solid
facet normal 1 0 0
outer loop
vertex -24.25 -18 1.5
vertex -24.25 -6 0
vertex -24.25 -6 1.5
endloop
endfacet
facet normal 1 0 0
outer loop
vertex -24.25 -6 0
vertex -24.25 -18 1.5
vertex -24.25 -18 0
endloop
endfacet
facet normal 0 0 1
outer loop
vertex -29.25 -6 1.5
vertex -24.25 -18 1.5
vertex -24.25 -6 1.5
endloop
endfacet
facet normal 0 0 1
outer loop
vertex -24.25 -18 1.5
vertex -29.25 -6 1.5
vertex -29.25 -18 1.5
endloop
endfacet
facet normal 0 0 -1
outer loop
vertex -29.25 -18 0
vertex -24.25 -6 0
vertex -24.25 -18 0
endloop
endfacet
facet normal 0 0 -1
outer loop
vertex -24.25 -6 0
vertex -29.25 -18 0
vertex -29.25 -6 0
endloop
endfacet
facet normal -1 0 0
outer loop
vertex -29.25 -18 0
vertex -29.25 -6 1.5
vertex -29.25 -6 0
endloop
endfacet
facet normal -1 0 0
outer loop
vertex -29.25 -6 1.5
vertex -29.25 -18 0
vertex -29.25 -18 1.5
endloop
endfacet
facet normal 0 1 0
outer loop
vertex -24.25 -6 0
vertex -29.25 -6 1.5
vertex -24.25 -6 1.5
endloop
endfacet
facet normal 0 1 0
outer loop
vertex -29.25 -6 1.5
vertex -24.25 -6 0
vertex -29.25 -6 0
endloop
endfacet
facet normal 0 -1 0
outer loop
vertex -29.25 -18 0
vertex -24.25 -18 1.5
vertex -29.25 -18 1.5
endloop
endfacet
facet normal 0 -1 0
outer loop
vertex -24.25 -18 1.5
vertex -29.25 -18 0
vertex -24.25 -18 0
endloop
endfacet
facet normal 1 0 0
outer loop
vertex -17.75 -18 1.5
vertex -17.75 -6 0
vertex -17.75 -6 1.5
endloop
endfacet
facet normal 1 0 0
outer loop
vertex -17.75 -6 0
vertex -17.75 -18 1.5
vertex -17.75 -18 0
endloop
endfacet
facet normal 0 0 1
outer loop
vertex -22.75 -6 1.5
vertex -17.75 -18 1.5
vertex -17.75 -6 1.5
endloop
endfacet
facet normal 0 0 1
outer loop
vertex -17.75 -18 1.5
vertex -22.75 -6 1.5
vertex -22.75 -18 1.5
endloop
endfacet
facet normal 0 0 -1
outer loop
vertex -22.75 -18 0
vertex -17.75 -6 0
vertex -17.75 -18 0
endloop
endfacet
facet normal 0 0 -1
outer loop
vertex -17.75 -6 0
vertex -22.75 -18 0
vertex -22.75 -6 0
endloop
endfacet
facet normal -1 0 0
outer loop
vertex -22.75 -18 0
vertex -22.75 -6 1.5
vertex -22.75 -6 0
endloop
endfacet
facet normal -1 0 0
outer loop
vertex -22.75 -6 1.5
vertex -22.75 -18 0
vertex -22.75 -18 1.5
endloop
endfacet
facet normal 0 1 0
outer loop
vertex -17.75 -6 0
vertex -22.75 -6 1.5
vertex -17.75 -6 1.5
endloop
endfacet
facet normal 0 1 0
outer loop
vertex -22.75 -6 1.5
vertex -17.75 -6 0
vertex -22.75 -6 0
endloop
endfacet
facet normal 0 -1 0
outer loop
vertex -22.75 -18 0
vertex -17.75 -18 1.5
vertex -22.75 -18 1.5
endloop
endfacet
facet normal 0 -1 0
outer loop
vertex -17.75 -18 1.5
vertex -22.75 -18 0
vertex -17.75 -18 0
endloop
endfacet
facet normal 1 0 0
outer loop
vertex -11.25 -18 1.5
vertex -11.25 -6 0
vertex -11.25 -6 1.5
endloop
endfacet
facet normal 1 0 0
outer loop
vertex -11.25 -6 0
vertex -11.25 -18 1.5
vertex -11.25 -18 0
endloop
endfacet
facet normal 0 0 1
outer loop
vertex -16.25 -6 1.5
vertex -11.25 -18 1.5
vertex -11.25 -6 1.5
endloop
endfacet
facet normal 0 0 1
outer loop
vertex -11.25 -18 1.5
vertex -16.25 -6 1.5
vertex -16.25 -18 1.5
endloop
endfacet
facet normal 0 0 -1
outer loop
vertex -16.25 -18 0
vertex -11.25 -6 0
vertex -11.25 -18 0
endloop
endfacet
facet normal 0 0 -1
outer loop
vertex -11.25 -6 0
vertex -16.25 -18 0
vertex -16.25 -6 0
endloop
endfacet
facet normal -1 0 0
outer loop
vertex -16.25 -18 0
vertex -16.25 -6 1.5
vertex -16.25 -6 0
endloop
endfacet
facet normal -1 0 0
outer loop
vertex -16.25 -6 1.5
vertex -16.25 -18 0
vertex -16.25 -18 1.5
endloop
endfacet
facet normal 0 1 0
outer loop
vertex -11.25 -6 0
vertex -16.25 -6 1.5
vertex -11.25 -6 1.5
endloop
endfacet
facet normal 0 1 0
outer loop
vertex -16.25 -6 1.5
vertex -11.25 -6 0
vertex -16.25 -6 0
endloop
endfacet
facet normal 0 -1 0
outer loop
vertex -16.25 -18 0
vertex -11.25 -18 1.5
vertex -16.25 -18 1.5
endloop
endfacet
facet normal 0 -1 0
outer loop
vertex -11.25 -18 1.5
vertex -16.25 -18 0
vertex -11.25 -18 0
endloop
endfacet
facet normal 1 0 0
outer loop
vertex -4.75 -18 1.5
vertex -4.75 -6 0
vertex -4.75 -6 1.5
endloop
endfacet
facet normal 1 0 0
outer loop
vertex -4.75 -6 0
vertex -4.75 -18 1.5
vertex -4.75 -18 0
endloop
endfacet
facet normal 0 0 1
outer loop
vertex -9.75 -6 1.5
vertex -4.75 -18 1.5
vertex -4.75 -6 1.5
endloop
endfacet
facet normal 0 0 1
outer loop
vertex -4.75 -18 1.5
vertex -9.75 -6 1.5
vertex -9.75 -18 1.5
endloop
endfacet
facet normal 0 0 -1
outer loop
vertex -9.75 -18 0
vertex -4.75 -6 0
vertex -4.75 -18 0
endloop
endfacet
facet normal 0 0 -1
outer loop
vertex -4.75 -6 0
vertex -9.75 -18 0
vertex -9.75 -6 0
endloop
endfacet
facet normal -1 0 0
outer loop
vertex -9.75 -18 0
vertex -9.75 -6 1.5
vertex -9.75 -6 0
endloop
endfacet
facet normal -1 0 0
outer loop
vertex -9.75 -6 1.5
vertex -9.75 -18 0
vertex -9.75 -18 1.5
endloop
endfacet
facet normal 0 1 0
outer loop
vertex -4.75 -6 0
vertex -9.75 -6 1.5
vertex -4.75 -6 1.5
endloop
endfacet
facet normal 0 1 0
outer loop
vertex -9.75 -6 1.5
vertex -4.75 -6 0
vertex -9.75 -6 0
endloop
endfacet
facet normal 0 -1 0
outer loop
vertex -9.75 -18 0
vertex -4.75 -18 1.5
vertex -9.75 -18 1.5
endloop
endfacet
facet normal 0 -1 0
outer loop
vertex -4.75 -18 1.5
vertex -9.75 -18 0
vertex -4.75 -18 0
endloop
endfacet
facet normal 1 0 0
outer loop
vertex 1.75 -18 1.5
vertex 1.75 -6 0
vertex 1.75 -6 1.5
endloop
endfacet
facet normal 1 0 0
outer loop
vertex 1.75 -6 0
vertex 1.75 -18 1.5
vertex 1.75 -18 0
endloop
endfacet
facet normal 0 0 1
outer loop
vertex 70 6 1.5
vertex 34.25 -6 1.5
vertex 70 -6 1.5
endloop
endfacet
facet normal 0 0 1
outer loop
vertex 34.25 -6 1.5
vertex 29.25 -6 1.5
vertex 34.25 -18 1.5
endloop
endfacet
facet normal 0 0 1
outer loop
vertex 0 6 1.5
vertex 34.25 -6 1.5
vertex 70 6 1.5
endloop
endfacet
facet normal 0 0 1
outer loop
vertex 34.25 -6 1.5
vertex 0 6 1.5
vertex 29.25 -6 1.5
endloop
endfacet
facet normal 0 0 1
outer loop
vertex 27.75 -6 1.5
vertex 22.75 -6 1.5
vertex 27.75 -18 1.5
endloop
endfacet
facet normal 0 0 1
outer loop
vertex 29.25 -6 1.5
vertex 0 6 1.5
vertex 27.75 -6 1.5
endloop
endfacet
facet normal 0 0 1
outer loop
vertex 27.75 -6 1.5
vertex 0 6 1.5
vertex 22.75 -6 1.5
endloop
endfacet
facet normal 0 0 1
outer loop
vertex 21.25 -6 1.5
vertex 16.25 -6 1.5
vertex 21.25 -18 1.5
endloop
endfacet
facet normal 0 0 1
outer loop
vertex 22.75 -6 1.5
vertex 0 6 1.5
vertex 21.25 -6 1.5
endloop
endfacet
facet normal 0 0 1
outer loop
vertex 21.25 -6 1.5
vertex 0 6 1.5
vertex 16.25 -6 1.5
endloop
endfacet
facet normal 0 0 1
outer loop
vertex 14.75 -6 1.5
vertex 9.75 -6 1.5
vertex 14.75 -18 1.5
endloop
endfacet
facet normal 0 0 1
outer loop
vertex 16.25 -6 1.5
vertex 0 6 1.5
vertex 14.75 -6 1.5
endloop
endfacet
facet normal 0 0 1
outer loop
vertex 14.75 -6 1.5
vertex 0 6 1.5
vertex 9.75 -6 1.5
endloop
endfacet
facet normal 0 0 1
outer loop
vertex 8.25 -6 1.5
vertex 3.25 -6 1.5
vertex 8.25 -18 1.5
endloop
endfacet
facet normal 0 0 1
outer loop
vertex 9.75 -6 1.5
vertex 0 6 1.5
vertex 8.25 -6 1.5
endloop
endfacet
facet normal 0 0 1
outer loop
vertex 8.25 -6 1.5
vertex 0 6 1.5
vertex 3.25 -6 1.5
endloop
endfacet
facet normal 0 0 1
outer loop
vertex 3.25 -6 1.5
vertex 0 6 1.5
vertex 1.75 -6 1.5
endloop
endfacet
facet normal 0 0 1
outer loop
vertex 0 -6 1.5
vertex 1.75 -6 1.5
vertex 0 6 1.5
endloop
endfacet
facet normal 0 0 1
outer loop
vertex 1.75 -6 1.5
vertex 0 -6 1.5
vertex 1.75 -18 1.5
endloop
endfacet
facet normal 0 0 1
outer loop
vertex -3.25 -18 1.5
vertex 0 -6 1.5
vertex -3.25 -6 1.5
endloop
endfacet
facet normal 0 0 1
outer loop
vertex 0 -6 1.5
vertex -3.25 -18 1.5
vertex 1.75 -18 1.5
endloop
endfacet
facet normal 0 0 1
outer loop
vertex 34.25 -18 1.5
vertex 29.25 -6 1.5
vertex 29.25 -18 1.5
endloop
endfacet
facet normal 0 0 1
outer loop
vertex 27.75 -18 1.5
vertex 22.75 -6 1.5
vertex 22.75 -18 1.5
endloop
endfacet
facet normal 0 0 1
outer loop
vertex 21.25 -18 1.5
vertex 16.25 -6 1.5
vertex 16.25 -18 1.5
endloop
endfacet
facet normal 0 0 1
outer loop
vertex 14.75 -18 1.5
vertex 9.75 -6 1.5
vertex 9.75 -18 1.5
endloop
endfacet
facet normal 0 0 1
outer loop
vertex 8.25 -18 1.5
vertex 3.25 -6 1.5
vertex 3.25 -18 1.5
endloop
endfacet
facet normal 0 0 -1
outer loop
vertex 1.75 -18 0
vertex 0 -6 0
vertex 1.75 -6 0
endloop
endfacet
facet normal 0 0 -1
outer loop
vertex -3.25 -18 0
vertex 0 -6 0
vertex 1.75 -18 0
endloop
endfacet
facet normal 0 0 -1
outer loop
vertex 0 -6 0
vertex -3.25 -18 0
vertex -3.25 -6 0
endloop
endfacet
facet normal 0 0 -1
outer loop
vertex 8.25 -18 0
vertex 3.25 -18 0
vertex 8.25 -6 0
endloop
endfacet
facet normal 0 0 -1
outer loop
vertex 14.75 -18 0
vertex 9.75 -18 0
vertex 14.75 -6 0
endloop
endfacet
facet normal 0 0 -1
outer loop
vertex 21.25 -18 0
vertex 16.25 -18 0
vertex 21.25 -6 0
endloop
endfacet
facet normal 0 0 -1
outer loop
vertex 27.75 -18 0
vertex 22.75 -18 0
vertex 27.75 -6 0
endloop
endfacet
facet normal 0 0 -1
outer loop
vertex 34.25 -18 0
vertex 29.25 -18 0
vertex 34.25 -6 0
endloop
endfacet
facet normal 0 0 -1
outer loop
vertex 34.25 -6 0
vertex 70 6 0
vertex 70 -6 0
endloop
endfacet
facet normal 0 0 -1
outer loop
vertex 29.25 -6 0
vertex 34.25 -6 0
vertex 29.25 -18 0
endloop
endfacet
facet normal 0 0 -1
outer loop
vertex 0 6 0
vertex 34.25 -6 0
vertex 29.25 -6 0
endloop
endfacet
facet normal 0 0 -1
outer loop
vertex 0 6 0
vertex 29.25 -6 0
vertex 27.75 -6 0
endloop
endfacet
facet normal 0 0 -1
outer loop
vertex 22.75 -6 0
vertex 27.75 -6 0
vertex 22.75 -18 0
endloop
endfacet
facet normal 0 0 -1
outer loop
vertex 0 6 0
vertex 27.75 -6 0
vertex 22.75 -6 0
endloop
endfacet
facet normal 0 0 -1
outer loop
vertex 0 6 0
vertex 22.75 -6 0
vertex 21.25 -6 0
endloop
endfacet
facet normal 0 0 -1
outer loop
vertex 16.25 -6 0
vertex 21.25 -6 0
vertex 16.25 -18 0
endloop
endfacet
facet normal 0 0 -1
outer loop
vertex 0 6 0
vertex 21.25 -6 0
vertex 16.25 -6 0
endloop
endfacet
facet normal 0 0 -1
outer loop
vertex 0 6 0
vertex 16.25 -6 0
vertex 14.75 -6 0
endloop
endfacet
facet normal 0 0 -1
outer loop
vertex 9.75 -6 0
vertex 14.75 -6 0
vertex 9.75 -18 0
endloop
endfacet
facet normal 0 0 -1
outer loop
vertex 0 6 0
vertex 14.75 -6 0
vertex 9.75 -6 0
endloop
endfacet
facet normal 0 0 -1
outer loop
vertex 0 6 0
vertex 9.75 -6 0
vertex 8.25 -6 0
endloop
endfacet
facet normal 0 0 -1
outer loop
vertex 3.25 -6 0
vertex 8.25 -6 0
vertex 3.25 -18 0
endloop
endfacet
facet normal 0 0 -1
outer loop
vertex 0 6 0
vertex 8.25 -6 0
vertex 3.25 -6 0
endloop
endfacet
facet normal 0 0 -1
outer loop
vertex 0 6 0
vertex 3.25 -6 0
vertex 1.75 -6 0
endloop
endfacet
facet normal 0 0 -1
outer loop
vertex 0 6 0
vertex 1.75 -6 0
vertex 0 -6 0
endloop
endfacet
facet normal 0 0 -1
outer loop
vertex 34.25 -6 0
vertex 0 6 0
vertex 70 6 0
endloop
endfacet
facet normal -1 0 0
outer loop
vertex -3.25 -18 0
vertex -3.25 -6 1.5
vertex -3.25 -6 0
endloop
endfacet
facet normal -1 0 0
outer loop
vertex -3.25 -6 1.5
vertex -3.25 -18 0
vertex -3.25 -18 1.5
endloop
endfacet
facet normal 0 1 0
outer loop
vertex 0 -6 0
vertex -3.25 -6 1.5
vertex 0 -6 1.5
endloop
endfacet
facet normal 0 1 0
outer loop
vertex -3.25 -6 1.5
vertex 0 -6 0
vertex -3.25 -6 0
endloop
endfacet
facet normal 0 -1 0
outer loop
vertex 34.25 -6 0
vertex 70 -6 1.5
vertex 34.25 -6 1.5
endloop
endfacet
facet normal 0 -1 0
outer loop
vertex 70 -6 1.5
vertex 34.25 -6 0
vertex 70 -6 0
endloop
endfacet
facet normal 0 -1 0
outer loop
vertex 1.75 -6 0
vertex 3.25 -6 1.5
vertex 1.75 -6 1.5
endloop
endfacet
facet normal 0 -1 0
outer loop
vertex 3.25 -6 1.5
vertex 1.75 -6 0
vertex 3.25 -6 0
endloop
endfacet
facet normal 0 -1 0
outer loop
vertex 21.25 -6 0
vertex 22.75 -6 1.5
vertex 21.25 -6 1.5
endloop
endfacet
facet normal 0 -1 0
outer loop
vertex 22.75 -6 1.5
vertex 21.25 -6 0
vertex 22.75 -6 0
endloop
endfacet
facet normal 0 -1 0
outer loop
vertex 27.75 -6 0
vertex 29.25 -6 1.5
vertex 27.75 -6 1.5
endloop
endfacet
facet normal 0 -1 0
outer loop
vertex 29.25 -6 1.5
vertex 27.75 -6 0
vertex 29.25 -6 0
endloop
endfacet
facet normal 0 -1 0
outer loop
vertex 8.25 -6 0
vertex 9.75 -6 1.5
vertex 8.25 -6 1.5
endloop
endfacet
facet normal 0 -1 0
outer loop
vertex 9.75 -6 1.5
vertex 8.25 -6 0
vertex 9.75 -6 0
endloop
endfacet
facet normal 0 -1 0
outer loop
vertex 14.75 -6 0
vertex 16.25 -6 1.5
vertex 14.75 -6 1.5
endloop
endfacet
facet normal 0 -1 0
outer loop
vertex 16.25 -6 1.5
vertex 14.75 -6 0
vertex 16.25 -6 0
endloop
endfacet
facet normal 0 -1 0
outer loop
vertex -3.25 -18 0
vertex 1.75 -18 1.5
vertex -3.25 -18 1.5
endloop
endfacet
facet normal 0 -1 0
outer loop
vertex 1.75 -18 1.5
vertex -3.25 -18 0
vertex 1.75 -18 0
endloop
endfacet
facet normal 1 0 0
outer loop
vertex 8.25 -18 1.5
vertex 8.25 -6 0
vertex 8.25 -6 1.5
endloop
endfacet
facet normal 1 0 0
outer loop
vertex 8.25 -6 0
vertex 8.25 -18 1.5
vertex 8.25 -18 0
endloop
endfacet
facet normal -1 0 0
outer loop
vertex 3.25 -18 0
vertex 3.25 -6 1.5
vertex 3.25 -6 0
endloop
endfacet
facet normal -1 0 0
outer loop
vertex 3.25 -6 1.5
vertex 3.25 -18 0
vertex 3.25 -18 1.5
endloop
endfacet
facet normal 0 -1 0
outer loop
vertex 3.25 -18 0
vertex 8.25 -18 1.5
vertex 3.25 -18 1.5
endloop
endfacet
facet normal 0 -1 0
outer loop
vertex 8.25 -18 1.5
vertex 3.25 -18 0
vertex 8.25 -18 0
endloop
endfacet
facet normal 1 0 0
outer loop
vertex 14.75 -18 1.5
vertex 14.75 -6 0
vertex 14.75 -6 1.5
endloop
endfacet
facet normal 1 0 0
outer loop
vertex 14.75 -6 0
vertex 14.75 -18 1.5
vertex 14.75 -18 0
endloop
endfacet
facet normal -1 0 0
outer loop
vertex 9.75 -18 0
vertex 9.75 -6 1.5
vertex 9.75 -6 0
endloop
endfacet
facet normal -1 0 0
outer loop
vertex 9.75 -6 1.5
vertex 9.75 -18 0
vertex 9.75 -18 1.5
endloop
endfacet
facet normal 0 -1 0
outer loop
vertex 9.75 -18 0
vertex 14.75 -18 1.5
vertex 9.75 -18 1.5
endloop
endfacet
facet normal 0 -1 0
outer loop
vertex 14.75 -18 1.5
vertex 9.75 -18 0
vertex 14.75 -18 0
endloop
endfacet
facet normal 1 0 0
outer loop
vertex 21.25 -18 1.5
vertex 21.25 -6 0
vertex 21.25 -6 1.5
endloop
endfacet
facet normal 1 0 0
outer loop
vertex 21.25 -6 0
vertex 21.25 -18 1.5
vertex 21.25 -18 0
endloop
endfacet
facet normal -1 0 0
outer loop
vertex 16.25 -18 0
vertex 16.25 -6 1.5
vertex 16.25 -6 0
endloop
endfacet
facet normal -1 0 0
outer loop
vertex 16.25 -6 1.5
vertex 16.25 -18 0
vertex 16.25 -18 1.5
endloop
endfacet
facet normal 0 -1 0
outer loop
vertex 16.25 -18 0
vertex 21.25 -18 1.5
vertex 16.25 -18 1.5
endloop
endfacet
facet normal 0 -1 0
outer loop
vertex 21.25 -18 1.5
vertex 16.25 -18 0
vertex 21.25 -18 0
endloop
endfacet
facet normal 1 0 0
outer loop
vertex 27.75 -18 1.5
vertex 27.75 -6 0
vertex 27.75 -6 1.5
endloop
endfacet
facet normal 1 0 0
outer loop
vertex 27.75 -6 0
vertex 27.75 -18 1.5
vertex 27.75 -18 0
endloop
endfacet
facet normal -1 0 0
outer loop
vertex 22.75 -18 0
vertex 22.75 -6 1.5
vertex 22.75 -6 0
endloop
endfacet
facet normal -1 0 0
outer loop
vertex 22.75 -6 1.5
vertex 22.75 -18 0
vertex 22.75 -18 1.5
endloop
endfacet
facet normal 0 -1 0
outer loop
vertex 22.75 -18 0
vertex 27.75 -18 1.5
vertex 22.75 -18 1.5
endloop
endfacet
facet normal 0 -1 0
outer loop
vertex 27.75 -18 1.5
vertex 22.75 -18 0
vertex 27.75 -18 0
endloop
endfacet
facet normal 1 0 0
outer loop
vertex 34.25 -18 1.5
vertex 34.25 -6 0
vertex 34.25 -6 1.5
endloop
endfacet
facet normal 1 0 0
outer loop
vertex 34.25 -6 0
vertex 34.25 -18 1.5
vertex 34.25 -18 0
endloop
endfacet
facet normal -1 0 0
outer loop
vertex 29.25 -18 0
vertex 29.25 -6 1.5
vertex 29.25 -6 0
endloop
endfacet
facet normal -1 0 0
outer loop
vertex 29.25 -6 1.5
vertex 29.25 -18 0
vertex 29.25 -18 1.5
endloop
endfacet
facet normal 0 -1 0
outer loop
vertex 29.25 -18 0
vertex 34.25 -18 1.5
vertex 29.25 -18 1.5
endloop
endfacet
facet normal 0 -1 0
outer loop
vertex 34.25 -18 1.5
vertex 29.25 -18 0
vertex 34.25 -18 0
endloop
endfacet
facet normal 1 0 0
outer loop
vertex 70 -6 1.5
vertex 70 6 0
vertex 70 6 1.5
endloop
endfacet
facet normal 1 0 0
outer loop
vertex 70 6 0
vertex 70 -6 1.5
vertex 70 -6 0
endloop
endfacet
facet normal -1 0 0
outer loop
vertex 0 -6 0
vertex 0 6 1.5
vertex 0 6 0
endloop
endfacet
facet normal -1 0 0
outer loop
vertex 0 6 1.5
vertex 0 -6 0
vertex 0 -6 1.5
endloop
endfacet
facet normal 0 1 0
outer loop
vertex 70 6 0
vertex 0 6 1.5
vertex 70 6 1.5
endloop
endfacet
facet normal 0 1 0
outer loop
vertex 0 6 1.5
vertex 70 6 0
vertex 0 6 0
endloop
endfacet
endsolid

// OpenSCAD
// 10-well agarose gel comb - flat plate with spine and 10 hanging teeth.
// Orientation: Lying flat on XY plane, spine along X, teeth hanging in -Y.

// Dimensions
spine_len = 70;   // Length of the spine (X)
spine_w   = 12;   // Width of the spine (Y)
plate_thk = 1.5;  // Thickness of the plate (Z)

tooth_w   = 5.0;  // Width of each tooth (X)
tooth_l   = 12;   // Length of each tooth (Y)
tooth_h   = 12;   // Height of each tooth hanging from spine (Y)
num_teeth = 10;   // Number of teeth
gap       = 1.5;  // Gap between teeth (X)

$fn = 64;

// Calculate total width of the tooth row
tooth_row_w = (num_teeth * tooth_w) + ((num_teeth - 1) * gap);

// Calculate the offset to centre the tooth row on the spine width
// Spine is 12mm wide. Tooth row is centered.
// The teeth hang from the -Y edge of the spine.
// Spine Y range: [-6, 6].
// Teeth hang in -Y.
// The attachment face is at Y = -6.
// The teeth extend from Y = -6 down to Y = -6 - tooth_h.
// Tooth row center Y = -6 - tooth_h / 2.
tooth_row_y_center = -spine_w / 2 - tooth_h / 2;

// Calculate X positions for the teeth
// Total width of tooth row = tooth_row_w.
// Center is at X = 0.
// Step size = tooth_w + gap.
// First tooth center = -tooth_row_w / 2 + tooth_w / 2.
step = tooth_w + gap;
first_tooth_x = -tooth_row_w / 2 + tooth_w / 2;

difference() {
    union() {
        // 1. The Spine (Back Bar)
        // Dimensions: spine_len x spine_w x plate_thk
        // Centered at origin, sitting on Z=0.
        translate([0, -spine_w / 2, 0]) 
            cube([spine_len, spine_w, plate_thk]);

        // 2. The Teeth
        // Each tooth is a block of size: tooth_w x tooth_h x plate_thk
        // They hang from the spine.
        // The spine is at Y = [-6, 6].
        // The teeth hang in -Y.
        // The attachment face is at Y = -6.
        // The teeth extend from Y = -6 to Y = -6 - tooth_h.
        
        for (i = [0 : num_teeth - 1]) {
            tx = first_tooth_x + i * step;
            
            // Tooth geometry
            // X: tx - tooth_w/2 to tx + tooth_w/2
            // Y: -spine_w/2 - tooth_h to -spine_w/2 (hanging down)
            // Z: 0 to plate_thk
            
            translate([tx, -spine_w / 2 - tooth_h, 0])
                cube([tooth_w, tooth_h, plate_thk]);
        }
    }
}
